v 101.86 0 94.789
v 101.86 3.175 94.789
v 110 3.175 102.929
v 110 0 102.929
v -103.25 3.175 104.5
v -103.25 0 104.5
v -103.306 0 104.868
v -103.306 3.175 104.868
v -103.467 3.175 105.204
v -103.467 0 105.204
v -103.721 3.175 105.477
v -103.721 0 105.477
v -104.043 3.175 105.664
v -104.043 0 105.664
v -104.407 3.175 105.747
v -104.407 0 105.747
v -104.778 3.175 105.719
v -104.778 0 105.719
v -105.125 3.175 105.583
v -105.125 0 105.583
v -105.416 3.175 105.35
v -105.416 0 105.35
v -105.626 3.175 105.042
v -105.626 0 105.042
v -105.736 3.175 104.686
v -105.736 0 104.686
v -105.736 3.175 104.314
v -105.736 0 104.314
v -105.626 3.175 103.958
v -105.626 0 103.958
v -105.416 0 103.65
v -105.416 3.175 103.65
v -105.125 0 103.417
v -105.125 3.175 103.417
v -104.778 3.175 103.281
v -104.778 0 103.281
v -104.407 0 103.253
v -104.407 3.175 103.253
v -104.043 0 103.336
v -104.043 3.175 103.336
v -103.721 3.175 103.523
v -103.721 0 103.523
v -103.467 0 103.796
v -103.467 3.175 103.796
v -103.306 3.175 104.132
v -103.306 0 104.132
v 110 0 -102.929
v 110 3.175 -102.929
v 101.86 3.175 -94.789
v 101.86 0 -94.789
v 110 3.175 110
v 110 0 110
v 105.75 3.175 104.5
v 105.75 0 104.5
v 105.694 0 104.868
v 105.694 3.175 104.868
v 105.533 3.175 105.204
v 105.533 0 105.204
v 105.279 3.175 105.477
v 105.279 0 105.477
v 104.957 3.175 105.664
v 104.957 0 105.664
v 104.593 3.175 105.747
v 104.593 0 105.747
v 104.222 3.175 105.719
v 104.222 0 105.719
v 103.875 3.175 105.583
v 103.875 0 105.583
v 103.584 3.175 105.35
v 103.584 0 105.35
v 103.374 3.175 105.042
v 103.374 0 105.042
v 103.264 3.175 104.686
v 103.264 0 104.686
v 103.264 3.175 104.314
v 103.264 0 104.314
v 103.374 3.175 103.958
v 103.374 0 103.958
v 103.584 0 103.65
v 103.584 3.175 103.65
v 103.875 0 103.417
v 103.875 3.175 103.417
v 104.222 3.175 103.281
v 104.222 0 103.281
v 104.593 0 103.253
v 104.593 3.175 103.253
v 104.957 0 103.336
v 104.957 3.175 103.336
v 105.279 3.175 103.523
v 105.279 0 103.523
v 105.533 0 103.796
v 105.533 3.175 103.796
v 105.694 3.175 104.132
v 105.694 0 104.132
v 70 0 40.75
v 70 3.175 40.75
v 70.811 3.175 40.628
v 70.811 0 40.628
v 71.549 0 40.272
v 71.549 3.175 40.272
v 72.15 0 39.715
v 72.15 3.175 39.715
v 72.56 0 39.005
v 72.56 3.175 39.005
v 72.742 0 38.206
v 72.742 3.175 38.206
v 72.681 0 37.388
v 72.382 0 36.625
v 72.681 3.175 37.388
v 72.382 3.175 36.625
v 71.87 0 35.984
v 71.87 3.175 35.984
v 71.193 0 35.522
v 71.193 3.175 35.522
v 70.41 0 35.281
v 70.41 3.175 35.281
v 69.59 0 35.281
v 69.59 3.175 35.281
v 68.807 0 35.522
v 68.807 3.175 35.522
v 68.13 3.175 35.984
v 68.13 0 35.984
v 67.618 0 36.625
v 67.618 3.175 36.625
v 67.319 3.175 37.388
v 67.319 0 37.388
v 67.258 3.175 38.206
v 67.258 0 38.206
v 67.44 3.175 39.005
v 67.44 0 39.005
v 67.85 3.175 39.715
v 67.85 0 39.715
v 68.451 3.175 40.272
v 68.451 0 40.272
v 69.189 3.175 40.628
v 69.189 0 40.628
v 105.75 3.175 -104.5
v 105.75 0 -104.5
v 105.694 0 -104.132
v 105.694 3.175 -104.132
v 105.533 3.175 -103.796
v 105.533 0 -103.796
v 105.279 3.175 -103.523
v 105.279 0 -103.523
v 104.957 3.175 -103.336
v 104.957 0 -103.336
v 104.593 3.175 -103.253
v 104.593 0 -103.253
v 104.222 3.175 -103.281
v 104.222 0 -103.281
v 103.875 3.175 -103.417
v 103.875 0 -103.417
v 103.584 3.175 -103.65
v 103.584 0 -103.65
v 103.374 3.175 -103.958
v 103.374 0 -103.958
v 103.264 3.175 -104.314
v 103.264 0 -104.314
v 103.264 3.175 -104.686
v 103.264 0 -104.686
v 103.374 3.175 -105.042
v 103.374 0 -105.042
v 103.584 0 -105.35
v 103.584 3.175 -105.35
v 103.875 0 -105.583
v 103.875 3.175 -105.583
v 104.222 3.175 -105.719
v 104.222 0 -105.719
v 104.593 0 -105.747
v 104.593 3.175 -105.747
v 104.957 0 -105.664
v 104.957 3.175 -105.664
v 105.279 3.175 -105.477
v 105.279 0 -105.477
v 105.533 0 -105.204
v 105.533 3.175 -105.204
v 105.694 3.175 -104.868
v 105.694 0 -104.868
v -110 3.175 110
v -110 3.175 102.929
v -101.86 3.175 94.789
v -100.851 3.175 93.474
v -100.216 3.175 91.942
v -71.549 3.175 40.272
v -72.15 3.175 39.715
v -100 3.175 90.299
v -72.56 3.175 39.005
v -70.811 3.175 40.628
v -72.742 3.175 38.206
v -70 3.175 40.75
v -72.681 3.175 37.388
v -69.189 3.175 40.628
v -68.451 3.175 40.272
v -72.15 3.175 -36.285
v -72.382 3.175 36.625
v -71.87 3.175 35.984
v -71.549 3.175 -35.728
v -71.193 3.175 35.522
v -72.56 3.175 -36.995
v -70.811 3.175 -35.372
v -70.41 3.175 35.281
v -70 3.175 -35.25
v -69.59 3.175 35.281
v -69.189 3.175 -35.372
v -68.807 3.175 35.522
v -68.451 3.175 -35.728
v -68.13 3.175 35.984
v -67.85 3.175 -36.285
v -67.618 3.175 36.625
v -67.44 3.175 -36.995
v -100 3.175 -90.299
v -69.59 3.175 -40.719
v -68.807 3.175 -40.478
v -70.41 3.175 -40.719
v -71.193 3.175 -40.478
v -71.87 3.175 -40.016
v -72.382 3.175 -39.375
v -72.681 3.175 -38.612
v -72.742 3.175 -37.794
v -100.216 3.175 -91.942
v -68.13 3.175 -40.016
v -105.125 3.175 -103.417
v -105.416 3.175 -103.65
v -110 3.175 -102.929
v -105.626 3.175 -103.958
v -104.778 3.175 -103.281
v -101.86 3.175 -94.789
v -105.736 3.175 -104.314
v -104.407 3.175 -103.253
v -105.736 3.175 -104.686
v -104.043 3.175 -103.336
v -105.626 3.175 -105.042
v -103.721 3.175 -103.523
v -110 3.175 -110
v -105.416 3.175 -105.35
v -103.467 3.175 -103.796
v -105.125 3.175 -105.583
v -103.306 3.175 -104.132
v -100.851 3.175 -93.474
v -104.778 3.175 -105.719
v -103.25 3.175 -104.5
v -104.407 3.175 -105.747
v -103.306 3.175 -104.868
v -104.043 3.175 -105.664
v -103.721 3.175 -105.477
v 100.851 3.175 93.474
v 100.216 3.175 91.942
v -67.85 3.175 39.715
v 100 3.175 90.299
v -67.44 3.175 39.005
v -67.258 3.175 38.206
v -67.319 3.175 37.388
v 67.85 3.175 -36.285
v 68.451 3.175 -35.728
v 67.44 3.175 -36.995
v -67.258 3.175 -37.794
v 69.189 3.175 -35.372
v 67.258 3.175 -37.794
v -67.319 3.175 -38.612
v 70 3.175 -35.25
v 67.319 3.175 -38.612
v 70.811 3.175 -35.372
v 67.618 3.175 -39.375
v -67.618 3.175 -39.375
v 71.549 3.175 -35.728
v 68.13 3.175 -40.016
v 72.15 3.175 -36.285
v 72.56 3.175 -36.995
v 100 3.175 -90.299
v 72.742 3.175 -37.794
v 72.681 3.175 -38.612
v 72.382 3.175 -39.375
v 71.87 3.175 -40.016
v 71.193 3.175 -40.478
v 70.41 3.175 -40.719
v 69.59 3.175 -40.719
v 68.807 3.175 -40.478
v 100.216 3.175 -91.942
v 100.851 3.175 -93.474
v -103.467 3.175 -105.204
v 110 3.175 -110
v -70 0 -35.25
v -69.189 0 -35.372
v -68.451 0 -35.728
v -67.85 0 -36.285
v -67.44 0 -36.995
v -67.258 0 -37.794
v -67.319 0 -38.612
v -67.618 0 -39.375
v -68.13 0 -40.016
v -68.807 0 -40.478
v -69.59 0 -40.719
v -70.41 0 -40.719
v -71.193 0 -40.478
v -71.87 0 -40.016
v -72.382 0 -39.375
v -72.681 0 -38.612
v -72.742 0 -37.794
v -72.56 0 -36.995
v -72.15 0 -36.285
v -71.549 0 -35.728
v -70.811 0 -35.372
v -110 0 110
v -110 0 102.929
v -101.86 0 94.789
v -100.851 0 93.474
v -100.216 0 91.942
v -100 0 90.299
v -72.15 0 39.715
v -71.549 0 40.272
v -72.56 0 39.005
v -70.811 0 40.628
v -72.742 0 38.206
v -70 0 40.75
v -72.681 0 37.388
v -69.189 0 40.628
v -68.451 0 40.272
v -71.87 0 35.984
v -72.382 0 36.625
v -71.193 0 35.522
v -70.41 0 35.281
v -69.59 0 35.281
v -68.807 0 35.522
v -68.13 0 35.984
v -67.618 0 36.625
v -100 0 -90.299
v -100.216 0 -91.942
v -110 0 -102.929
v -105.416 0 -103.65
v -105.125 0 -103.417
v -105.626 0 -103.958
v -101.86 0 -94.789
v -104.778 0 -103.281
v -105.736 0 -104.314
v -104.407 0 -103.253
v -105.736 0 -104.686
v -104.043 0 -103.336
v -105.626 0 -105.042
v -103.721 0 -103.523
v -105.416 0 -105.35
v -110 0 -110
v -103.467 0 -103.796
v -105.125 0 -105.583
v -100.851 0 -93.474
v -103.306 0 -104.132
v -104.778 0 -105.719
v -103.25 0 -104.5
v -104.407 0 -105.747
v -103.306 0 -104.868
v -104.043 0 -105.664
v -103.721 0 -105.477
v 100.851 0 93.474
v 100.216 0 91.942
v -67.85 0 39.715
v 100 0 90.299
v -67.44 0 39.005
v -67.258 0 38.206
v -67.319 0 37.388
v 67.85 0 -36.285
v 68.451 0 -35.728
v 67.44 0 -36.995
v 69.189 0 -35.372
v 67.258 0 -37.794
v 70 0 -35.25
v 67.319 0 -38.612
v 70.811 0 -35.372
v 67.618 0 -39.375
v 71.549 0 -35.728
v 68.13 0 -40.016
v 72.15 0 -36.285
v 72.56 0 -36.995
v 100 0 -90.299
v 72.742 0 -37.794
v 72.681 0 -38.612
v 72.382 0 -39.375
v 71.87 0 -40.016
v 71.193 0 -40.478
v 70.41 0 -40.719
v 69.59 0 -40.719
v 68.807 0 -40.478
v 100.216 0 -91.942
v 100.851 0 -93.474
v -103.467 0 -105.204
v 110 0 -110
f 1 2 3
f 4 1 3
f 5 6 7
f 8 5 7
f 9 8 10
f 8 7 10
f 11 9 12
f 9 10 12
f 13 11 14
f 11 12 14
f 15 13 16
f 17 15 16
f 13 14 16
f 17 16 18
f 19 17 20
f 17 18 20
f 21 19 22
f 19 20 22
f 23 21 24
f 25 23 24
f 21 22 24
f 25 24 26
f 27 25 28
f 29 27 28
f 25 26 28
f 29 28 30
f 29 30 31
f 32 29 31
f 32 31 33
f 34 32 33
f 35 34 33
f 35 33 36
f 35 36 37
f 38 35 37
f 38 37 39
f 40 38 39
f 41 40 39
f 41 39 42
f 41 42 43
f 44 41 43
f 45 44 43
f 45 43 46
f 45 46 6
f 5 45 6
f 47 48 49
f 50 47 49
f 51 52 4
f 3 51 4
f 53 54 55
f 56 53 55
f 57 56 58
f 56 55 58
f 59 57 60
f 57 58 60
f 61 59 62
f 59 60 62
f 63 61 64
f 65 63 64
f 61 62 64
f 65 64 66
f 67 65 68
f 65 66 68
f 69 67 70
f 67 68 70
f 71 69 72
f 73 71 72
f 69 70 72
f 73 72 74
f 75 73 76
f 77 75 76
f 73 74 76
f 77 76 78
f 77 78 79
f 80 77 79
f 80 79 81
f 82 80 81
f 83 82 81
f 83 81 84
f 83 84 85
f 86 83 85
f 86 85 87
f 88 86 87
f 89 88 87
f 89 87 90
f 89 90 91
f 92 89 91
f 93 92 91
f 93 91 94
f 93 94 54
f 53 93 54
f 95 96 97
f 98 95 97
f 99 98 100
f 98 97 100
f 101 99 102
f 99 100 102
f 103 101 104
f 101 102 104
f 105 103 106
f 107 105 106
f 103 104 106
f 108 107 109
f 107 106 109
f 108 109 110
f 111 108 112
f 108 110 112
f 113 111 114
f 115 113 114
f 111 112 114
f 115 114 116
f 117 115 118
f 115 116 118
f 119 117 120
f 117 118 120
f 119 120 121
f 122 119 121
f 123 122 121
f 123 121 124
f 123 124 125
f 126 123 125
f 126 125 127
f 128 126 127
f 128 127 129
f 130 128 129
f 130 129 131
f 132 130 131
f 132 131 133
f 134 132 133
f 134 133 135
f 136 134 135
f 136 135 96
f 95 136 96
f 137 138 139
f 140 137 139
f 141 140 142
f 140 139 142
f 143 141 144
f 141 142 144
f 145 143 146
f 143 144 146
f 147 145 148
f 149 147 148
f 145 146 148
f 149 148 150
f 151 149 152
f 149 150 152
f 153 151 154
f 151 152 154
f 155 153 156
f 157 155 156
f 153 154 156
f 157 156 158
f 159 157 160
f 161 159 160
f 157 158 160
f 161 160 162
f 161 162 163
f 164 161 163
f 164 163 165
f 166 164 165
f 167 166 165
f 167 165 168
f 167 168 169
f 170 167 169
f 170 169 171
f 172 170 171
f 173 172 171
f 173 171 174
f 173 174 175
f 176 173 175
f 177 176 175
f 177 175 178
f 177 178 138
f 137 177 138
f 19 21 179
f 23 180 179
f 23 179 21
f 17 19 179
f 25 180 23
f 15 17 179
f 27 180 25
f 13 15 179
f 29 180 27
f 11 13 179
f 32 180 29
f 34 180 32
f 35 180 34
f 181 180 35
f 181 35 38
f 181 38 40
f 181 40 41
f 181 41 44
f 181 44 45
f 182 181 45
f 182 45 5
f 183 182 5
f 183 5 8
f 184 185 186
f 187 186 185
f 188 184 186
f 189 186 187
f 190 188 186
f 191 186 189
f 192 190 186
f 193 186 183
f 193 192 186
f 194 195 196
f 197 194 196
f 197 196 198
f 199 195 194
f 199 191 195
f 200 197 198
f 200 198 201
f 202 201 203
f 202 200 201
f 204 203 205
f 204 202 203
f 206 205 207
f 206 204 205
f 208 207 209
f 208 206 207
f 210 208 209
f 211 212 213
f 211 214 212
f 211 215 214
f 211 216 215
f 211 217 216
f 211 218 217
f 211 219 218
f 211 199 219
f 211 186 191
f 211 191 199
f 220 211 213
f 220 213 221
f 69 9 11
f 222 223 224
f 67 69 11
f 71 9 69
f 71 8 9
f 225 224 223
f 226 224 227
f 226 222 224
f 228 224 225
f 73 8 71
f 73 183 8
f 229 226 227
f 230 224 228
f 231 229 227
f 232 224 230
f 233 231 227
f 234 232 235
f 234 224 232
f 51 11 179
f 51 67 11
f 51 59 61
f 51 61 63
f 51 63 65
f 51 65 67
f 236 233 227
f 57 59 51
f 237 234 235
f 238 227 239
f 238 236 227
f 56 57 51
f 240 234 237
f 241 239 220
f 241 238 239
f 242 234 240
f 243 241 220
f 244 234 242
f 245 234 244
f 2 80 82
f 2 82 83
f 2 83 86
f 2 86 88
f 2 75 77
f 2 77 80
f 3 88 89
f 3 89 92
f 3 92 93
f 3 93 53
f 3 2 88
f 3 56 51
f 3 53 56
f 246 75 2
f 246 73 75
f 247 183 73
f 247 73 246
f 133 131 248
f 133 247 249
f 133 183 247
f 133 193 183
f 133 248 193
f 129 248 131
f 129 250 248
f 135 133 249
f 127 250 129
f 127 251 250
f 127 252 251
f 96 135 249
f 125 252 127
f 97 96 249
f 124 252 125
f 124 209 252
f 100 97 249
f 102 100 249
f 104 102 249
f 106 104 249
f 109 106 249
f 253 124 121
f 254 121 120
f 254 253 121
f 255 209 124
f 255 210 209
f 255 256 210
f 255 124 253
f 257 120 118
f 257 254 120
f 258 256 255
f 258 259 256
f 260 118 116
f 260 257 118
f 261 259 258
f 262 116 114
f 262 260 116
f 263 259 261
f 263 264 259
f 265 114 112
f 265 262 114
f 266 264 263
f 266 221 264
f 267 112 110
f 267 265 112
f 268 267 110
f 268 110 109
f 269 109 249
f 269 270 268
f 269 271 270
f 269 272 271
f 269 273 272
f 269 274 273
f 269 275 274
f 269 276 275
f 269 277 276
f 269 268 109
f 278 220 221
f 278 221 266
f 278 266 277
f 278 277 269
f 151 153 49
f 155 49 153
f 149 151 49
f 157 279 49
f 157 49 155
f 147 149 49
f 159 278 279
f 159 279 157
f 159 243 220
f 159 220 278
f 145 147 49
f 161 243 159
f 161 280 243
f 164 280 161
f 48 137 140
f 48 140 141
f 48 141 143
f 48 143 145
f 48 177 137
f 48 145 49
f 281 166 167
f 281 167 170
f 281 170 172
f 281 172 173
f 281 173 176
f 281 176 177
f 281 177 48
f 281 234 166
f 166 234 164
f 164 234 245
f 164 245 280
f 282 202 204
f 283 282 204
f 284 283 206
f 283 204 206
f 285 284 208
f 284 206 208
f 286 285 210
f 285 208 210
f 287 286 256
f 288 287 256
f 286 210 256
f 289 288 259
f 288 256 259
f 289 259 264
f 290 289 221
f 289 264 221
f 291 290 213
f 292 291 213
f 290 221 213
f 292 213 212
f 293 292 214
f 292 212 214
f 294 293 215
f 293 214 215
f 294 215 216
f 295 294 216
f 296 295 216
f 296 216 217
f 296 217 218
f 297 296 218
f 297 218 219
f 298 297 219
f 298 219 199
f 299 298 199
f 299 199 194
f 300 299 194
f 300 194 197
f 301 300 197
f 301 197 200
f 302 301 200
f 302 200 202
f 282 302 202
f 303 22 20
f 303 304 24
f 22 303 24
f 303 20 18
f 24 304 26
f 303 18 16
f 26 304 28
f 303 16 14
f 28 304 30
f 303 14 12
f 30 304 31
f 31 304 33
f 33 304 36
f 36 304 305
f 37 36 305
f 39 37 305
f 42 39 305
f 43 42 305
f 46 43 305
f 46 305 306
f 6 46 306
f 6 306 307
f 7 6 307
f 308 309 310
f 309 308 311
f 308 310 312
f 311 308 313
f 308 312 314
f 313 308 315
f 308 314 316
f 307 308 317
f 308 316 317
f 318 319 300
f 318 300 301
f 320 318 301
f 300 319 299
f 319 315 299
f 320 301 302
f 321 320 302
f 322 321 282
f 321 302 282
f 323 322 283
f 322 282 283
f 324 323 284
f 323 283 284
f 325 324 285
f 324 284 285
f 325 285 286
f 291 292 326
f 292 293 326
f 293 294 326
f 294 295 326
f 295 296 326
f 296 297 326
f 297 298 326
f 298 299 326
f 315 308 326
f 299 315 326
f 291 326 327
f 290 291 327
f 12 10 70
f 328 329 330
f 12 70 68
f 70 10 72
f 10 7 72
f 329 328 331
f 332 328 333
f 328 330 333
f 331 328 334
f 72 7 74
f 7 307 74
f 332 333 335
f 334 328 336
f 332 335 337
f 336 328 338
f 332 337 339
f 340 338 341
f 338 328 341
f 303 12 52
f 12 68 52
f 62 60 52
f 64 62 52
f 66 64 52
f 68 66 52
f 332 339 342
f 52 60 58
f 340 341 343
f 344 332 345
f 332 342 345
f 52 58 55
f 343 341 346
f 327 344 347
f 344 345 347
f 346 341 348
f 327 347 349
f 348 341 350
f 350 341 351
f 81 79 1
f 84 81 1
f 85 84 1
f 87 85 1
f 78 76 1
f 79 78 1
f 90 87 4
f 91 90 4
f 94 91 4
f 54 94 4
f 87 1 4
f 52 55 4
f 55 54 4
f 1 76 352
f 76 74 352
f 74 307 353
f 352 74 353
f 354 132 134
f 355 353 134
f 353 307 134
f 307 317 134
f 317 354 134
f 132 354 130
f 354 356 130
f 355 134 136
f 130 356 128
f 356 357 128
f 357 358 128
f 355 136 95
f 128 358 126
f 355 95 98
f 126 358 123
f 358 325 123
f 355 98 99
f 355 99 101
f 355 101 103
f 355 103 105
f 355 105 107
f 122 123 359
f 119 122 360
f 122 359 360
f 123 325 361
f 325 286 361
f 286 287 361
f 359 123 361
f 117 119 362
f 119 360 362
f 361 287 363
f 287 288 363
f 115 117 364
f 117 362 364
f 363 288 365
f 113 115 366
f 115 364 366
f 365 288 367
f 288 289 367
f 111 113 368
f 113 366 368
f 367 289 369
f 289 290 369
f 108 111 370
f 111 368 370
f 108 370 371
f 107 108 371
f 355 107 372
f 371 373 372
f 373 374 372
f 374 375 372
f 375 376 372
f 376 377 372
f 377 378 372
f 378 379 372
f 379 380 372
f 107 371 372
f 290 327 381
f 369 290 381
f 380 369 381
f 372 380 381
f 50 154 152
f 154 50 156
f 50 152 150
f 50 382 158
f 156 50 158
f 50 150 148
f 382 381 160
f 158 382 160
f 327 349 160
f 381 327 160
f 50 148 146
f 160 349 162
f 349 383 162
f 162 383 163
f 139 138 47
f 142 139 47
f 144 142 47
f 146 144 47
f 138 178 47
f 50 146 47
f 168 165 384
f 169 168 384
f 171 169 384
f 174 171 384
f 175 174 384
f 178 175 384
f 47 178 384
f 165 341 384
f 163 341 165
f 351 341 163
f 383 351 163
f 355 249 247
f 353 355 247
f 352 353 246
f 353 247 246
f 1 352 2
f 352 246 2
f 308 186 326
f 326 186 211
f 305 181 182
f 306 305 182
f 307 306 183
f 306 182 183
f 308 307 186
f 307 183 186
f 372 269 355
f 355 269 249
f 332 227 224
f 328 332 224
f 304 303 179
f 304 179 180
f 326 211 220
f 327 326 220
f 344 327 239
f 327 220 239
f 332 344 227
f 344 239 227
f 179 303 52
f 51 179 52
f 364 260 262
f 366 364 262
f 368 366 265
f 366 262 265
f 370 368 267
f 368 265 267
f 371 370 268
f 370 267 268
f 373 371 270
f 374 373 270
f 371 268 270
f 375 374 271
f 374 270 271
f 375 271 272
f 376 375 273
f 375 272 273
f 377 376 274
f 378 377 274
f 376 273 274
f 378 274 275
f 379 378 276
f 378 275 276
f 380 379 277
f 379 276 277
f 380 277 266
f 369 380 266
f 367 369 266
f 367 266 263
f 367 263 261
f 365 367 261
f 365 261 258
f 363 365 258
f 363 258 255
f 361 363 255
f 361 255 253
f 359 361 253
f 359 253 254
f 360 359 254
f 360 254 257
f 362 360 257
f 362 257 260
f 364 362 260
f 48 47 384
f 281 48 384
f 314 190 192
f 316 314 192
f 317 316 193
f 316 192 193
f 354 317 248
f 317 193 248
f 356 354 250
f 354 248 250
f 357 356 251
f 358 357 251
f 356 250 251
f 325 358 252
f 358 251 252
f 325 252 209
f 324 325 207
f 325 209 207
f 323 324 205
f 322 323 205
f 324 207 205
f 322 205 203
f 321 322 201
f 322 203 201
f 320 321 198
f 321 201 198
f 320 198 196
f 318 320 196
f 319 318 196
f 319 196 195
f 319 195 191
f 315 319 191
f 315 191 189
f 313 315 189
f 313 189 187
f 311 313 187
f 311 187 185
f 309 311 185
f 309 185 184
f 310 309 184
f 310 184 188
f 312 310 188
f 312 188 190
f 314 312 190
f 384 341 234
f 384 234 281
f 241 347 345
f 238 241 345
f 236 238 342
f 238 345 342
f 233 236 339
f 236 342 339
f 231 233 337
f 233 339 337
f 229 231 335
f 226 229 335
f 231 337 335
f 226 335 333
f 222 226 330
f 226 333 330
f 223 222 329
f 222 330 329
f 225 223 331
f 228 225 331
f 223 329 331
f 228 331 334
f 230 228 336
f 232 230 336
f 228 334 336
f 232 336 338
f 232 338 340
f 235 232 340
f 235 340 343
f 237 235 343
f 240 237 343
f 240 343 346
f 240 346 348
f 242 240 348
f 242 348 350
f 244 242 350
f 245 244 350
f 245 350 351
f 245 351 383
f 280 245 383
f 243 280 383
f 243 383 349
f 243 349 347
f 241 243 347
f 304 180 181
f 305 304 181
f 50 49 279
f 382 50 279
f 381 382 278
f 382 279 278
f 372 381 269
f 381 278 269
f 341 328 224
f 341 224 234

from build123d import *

# Parameters (mm, degrees)
SKETCH1_W             = 220
SKETCH1_H             = 220
BOSS_EXTRUDE1_DEPTH   = 3.175
M3X0_5_TAPPED_HOLE1_D = 2.5
SKETCH4_R             = 2.75
CUT_EXTRUDE1_DEPTH    = 4.175
CUT_EXTRUDE2_DEPTH    = 4.175


with BuildPart() as part:
    # Sketch1 → Boss-Extrude1 (new body)
    with BuildSketch(Plane(origin=(0, 0, 0), x_dir=(1, 0, 0), z_dir=(0, 1, 0))):
        Rectangle(SKETCH1_W, SKETCH1_H)
    extrude(amount=BOSS_EXTRUDE1_DEPTH)

    # M3x0.5 Tapped Hole1 (through all)
    with Locations(Plane(origin=(0, 3.175, 0), x_dir=(-1, 0, 0), z_dir=(0, 1, 0))):
        with Locations((104.5, -104.5), (-104.5, -104.5), (-104.5, 104.5), (104.5, 104.5)):
            Hole(M3X0_5_TAPPED_HOLE1_D / 2)

    # Sketch4 → Cut-Extrude1 (cut, through all)
    with BuildSketch(Plane(origin=(0, 3.175, 0), x_dir=(1, 0, 0), z_dir=(0, 1, 0))):
        with Locations(Location((-70, 38, 0), (0, 0, 270))):  # turned: the seam where the file's is
            Circle(SKETCH4_R)
        with Locations(Location((-70, -38, 0), (0, 0, 270))):  # turned: the seam where the file's is
            Circle(SKETCH4_R)
        with Locations(Location((70, -38, 0), (0, 0, 270))):  # turned: the seam where the file's is
            Circle(SKETCH4_R)
        with Locations(Location((70, 38, 0), (0, 0, 270))):  # turned: the seam where the file's is
            Circle(SKETCH4_R)
    extrude(amount=-CUT_EXTRUDE1_DEPTH, mode=Mode.SUBTRACT)

    # Sketch5 → Cut-Extrude2 (cut, through all)
    with BuildSketch(Plane(origin=(0, 3.175, 0), x_dir=(1, 0, 0), z_dir=(0, 1, 0))):
        with BuildLine():
            Line((-110, 102.928932188), (-110, -102.928932188))
            Line((-110, -102.928932188), (-101.859871939, -94.788804128))
            ThreePointArc((-101.859871939, -94.788804128), (-100.483364969, -92.728715863), (-100, -90.298676067))
            Line((-100, -90.298676067), (-100, 90.298676067))
            ThreePointArc((-100, 90.298676067), (-100.483364969, 92.728715863), (-101.859871939, 94.788804128))
            Line((-101.859871939, 94.788804128), (-110, 102.928932188))
        make_face()
        with BuildLine():
            Line((110, 102.928932188), (101.859871939, 94.788804128))
            ThreePointArc((101.859871939, 94.788804128), (100.483364969, 92.728715863), (100, 90.298676067))
            Line((100, 90.298676067), (100, -90.298676067))
            ThreePointArc((100, -90.298676067), (100.483364969, -92.728715863), (101.859871939, -94.788804128))
            Line((101.859871939, -94.788804128), (110, -102.928932188))
            Line((110, -102.928932188), (110, 102.928932188))
        make_face()
    extrude(amount=-CUT_EXTRUDE2_DEPTH, mode=Mode.SUBTRACT)


solid = part.part
